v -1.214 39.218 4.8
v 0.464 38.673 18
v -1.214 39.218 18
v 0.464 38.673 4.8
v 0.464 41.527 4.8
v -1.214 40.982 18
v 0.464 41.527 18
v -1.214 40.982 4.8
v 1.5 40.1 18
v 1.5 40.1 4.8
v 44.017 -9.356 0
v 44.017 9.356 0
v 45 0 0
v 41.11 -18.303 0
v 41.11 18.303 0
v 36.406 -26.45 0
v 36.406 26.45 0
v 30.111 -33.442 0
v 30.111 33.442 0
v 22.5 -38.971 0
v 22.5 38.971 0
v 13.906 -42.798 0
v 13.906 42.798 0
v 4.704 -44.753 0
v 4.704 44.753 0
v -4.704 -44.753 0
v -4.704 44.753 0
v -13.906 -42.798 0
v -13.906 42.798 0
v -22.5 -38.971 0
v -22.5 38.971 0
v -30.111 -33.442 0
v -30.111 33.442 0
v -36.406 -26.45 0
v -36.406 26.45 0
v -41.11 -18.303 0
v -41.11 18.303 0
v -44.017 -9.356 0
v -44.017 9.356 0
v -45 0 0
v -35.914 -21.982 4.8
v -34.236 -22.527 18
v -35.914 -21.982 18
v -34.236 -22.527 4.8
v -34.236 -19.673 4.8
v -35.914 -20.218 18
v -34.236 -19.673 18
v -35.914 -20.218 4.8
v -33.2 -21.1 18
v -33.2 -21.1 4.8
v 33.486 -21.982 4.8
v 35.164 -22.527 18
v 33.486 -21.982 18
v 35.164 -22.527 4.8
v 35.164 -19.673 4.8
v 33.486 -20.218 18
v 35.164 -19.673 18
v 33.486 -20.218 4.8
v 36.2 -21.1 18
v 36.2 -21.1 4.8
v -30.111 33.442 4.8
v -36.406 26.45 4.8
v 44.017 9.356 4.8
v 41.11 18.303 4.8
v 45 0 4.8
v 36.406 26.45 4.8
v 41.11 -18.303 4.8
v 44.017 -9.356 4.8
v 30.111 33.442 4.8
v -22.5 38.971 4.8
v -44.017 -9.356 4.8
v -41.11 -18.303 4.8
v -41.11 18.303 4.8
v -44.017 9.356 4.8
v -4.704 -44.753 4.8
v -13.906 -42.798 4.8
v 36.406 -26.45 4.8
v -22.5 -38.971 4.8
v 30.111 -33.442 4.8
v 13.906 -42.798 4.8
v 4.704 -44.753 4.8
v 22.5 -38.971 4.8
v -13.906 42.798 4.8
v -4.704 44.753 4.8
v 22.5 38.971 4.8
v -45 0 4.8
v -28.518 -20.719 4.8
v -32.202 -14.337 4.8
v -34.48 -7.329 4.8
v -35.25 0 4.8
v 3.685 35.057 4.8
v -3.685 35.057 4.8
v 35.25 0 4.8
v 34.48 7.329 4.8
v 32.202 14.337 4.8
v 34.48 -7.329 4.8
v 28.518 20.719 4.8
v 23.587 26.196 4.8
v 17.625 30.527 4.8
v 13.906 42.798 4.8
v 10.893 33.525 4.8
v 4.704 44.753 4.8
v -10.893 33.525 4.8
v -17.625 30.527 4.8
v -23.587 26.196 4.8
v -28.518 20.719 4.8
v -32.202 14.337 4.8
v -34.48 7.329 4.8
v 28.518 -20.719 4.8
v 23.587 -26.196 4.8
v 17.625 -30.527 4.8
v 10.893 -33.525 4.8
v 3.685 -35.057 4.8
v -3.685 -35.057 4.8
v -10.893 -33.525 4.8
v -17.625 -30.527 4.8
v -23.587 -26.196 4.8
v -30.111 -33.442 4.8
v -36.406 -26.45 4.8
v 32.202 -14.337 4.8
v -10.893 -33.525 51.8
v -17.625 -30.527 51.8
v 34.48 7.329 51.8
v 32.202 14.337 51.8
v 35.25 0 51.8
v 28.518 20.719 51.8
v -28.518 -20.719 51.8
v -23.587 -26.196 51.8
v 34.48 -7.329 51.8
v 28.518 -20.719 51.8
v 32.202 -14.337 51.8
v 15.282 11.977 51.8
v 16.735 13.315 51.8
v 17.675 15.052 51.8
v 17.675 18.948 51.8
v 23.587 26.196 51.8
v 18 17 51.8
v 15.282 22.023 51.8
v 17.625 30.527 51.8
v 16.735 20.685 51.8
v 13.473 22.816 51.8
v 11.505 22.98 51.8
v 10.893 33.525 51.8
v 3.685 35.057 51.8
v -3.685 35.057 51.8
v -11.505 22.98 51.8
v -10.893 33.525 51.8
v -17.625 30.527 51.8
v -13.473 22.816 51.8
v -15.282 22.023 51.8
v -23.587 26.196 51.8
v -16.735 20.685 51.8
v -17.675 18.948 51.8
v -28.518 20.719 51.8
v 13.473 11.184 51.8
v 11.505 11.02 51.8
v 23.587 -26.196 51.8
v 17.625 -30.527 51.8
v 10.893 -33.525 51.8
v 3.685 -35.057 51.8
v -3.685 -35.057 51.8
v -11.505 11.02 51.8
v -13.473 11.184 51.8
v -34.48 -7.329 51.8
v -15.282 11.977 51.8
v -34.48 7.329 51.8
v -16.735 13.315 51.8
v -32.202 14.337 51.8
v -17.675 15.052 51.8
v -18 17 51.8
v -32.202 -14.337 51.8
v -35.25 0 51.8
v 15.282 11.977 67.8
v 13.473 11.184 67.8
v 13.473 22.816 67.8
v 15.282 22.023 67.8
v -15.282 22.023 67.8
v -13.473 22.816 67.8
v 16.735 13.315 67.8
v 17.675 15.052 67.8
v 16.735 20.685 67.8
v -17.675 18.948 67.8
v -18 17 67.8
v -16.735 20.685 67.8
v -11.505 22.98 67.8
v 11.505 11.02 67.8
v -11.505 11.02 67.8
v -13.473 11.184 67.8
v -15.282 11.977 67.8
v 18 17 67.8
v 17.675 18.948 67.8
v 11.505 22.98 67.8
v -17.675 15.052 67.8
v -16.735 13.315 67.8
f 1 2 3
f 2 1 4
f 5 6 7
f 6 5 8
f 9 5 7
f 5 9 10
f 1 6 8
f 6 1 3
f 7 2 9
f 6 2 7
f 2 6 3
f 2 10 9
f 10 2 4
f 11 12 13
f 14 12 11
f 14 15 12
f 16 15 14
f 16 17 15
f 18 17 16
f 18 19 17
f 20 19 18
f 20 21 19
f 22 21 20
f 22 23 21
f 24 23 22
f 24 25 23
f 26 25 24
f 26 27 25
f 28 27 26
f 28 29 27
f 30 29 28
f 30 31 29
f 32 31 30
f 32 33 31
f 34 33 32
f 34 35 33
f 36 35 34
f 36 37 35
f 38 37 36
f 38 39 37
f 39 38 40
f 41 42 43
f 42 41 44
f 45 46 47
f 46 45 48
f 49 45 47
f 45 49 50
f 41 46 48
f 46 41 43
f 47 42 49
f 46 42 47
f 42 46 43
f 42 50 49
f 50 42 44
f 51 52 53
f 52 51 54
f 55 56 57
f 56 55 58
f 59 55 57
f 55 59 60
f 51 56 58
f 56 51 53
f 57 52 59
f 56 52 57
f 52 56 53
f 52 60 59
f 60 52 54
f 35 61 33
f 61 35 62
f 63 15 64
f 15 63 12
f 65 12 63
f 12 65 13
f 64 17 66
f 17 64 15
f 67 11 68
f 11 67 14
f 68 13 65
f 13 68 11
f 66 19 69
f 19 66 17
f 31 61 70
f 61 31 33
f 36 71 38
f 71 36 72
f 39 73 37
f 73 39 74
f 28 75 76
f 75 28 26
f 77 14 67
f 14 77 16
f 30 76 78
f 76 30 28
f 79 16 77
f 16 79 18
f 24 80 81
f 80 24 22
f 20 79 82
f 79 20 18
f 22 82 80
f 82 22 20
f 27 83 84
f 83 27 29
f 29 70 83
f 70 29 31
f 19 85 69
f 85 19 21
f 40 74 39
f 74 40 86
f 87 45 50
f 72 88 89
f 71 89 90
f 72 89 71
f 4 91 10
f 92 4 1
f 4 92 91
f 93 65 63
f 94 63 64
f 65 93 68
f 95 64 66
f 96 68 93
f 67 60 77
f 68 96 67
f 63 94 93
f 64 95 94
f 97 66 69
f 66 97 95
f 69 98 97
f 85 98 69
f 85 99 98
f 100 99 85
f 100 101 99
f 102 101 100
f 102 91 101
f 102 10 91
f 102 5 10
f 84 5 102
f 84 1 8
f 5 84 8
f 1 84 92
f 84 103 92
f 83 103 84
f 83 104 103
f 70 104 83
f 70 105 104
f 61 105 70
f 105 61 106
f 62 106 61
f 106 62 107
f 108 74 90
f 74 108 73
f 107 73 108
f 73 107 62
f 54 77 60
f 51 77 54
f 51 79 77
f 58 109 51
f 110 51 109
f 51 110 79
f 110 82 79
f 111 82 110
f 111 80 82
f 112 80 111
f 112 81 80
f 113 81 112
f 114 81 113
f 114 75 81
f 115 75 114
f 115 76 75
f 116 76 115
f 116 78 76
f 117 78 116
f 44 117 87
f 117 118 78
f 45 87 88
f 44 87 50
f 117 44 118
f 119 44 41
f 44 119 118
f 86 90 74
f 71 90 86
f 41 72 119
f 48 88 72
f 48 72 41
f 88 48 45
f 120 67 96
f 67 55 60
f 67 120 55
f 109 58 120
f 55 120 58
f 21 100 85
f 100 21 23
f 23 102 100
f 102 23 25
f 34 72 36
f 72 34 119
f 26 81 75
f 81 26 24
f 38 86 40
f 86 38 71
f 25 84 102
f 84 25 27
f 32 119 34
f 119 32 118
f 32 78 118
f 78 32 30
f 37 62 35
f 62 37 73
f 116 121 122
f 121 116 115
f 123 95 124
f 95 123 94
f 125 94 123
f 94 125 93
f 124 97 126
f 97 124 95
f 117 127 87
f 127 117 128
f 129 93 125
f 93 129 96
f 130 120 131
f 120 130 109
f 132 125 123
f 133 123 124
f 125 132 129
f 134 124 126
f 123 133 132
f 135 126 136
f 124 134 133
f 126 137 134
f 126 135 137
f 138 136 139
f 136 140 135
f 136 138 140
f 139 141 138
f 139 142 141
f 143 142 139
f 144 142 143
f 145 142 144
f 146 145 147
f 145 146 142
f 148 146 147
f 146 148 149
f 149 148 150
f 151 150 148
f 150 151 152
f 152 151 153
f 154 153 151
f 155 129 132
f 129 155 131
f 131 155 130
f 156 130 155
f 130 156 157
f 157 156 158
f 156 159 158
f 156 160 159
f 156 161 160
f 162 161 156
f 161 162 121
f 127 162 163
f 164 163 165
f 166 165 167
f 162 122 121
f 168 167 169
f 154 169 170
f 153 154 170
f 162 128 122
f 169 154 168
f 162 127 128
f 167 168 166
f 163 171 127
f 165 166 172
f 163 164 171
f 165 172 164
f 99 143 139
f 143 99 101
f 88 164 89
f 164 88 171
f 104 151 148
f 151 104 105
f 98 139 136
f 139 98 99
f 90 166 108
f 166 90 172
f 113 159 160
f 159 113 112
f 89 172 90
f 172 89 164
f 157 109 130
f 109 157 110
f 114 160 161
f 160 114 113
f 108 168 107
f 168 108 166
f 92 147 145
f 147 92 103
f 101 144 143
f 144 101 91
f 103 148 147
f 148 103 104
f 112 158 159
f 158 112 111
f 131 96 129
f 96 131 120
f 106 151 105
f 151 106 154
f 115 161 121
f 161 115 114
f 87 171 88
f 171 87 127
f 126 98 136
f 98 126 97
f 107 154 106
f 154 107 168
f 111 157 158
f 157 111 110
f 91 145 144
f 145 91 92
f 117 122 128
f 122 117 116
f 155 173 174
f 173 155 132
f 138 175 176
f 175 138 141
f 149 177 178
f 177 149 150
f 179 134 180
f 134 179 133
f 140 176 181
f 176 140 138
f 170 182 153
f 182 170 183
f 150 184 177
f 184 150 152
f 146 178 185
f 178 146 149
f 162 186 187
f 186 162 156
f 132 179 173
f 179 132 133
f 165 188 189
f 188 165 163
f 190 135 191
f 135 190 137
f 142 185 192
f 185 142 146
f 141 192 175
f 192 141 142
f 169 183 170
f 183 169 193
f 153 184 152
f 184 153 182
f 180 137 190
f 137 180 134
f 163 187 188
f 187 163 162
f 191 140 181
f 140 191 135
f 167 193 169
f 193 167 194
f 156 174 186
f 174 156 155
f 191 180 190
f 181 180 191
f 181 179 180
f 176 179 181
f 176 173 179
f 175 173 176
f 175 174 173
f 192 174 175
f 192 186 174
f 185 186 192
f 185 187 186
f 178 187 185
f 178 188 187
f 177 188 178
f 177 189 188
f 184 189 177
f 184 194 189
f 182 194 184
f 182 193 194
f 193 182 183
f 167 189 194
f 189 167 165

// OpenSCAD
MeterGauge();
rimDiameter = 90;
rimHeight = 4.8;
bodyDiameter = 70.5;
bodyHeight = 47;

module MeterGauge() {
    union() {
        // Outer Rim
        cylinder(h = rimHeight, d = rimDiameter);
        
        // Body
        translate([0, 0, rimHeight]) {
            cylinder(h = bodyHeight, d = bodyDiameter);
        }
        
        // Terminals
        hull() {
            hull() {
                terminal();
                mirror([1,0,0]) terminal();
            }
            /*
            translate ([0, -70, 0]) {
                hull() {
                    terminal();
                    mirror([1,0,0]) terminal();
                }
            }
            */
        }
        
        // Screw holes
        translate([0, 40.1, 0]) {
            m3screw();
            translate([-69.4/2, -61.2]) {
                m3screw();
            }
            translate([69.4/2, -61.2]) {
                m3screw();
            }
        }
    }
}

module terminal() {
    translate([12, 17, rimHeight + bodyHeight]) {
        terminalHeight = 16;
        terminalDiameter = 12;
        cylinder(h = terminalHeight, d = terminalDiameter);
    }
}

module m3screw () {
    screwHeight = 18;
    screwDiameter = 3;
    cylinder(h= screwHeight, d = screwDiameter);
}
